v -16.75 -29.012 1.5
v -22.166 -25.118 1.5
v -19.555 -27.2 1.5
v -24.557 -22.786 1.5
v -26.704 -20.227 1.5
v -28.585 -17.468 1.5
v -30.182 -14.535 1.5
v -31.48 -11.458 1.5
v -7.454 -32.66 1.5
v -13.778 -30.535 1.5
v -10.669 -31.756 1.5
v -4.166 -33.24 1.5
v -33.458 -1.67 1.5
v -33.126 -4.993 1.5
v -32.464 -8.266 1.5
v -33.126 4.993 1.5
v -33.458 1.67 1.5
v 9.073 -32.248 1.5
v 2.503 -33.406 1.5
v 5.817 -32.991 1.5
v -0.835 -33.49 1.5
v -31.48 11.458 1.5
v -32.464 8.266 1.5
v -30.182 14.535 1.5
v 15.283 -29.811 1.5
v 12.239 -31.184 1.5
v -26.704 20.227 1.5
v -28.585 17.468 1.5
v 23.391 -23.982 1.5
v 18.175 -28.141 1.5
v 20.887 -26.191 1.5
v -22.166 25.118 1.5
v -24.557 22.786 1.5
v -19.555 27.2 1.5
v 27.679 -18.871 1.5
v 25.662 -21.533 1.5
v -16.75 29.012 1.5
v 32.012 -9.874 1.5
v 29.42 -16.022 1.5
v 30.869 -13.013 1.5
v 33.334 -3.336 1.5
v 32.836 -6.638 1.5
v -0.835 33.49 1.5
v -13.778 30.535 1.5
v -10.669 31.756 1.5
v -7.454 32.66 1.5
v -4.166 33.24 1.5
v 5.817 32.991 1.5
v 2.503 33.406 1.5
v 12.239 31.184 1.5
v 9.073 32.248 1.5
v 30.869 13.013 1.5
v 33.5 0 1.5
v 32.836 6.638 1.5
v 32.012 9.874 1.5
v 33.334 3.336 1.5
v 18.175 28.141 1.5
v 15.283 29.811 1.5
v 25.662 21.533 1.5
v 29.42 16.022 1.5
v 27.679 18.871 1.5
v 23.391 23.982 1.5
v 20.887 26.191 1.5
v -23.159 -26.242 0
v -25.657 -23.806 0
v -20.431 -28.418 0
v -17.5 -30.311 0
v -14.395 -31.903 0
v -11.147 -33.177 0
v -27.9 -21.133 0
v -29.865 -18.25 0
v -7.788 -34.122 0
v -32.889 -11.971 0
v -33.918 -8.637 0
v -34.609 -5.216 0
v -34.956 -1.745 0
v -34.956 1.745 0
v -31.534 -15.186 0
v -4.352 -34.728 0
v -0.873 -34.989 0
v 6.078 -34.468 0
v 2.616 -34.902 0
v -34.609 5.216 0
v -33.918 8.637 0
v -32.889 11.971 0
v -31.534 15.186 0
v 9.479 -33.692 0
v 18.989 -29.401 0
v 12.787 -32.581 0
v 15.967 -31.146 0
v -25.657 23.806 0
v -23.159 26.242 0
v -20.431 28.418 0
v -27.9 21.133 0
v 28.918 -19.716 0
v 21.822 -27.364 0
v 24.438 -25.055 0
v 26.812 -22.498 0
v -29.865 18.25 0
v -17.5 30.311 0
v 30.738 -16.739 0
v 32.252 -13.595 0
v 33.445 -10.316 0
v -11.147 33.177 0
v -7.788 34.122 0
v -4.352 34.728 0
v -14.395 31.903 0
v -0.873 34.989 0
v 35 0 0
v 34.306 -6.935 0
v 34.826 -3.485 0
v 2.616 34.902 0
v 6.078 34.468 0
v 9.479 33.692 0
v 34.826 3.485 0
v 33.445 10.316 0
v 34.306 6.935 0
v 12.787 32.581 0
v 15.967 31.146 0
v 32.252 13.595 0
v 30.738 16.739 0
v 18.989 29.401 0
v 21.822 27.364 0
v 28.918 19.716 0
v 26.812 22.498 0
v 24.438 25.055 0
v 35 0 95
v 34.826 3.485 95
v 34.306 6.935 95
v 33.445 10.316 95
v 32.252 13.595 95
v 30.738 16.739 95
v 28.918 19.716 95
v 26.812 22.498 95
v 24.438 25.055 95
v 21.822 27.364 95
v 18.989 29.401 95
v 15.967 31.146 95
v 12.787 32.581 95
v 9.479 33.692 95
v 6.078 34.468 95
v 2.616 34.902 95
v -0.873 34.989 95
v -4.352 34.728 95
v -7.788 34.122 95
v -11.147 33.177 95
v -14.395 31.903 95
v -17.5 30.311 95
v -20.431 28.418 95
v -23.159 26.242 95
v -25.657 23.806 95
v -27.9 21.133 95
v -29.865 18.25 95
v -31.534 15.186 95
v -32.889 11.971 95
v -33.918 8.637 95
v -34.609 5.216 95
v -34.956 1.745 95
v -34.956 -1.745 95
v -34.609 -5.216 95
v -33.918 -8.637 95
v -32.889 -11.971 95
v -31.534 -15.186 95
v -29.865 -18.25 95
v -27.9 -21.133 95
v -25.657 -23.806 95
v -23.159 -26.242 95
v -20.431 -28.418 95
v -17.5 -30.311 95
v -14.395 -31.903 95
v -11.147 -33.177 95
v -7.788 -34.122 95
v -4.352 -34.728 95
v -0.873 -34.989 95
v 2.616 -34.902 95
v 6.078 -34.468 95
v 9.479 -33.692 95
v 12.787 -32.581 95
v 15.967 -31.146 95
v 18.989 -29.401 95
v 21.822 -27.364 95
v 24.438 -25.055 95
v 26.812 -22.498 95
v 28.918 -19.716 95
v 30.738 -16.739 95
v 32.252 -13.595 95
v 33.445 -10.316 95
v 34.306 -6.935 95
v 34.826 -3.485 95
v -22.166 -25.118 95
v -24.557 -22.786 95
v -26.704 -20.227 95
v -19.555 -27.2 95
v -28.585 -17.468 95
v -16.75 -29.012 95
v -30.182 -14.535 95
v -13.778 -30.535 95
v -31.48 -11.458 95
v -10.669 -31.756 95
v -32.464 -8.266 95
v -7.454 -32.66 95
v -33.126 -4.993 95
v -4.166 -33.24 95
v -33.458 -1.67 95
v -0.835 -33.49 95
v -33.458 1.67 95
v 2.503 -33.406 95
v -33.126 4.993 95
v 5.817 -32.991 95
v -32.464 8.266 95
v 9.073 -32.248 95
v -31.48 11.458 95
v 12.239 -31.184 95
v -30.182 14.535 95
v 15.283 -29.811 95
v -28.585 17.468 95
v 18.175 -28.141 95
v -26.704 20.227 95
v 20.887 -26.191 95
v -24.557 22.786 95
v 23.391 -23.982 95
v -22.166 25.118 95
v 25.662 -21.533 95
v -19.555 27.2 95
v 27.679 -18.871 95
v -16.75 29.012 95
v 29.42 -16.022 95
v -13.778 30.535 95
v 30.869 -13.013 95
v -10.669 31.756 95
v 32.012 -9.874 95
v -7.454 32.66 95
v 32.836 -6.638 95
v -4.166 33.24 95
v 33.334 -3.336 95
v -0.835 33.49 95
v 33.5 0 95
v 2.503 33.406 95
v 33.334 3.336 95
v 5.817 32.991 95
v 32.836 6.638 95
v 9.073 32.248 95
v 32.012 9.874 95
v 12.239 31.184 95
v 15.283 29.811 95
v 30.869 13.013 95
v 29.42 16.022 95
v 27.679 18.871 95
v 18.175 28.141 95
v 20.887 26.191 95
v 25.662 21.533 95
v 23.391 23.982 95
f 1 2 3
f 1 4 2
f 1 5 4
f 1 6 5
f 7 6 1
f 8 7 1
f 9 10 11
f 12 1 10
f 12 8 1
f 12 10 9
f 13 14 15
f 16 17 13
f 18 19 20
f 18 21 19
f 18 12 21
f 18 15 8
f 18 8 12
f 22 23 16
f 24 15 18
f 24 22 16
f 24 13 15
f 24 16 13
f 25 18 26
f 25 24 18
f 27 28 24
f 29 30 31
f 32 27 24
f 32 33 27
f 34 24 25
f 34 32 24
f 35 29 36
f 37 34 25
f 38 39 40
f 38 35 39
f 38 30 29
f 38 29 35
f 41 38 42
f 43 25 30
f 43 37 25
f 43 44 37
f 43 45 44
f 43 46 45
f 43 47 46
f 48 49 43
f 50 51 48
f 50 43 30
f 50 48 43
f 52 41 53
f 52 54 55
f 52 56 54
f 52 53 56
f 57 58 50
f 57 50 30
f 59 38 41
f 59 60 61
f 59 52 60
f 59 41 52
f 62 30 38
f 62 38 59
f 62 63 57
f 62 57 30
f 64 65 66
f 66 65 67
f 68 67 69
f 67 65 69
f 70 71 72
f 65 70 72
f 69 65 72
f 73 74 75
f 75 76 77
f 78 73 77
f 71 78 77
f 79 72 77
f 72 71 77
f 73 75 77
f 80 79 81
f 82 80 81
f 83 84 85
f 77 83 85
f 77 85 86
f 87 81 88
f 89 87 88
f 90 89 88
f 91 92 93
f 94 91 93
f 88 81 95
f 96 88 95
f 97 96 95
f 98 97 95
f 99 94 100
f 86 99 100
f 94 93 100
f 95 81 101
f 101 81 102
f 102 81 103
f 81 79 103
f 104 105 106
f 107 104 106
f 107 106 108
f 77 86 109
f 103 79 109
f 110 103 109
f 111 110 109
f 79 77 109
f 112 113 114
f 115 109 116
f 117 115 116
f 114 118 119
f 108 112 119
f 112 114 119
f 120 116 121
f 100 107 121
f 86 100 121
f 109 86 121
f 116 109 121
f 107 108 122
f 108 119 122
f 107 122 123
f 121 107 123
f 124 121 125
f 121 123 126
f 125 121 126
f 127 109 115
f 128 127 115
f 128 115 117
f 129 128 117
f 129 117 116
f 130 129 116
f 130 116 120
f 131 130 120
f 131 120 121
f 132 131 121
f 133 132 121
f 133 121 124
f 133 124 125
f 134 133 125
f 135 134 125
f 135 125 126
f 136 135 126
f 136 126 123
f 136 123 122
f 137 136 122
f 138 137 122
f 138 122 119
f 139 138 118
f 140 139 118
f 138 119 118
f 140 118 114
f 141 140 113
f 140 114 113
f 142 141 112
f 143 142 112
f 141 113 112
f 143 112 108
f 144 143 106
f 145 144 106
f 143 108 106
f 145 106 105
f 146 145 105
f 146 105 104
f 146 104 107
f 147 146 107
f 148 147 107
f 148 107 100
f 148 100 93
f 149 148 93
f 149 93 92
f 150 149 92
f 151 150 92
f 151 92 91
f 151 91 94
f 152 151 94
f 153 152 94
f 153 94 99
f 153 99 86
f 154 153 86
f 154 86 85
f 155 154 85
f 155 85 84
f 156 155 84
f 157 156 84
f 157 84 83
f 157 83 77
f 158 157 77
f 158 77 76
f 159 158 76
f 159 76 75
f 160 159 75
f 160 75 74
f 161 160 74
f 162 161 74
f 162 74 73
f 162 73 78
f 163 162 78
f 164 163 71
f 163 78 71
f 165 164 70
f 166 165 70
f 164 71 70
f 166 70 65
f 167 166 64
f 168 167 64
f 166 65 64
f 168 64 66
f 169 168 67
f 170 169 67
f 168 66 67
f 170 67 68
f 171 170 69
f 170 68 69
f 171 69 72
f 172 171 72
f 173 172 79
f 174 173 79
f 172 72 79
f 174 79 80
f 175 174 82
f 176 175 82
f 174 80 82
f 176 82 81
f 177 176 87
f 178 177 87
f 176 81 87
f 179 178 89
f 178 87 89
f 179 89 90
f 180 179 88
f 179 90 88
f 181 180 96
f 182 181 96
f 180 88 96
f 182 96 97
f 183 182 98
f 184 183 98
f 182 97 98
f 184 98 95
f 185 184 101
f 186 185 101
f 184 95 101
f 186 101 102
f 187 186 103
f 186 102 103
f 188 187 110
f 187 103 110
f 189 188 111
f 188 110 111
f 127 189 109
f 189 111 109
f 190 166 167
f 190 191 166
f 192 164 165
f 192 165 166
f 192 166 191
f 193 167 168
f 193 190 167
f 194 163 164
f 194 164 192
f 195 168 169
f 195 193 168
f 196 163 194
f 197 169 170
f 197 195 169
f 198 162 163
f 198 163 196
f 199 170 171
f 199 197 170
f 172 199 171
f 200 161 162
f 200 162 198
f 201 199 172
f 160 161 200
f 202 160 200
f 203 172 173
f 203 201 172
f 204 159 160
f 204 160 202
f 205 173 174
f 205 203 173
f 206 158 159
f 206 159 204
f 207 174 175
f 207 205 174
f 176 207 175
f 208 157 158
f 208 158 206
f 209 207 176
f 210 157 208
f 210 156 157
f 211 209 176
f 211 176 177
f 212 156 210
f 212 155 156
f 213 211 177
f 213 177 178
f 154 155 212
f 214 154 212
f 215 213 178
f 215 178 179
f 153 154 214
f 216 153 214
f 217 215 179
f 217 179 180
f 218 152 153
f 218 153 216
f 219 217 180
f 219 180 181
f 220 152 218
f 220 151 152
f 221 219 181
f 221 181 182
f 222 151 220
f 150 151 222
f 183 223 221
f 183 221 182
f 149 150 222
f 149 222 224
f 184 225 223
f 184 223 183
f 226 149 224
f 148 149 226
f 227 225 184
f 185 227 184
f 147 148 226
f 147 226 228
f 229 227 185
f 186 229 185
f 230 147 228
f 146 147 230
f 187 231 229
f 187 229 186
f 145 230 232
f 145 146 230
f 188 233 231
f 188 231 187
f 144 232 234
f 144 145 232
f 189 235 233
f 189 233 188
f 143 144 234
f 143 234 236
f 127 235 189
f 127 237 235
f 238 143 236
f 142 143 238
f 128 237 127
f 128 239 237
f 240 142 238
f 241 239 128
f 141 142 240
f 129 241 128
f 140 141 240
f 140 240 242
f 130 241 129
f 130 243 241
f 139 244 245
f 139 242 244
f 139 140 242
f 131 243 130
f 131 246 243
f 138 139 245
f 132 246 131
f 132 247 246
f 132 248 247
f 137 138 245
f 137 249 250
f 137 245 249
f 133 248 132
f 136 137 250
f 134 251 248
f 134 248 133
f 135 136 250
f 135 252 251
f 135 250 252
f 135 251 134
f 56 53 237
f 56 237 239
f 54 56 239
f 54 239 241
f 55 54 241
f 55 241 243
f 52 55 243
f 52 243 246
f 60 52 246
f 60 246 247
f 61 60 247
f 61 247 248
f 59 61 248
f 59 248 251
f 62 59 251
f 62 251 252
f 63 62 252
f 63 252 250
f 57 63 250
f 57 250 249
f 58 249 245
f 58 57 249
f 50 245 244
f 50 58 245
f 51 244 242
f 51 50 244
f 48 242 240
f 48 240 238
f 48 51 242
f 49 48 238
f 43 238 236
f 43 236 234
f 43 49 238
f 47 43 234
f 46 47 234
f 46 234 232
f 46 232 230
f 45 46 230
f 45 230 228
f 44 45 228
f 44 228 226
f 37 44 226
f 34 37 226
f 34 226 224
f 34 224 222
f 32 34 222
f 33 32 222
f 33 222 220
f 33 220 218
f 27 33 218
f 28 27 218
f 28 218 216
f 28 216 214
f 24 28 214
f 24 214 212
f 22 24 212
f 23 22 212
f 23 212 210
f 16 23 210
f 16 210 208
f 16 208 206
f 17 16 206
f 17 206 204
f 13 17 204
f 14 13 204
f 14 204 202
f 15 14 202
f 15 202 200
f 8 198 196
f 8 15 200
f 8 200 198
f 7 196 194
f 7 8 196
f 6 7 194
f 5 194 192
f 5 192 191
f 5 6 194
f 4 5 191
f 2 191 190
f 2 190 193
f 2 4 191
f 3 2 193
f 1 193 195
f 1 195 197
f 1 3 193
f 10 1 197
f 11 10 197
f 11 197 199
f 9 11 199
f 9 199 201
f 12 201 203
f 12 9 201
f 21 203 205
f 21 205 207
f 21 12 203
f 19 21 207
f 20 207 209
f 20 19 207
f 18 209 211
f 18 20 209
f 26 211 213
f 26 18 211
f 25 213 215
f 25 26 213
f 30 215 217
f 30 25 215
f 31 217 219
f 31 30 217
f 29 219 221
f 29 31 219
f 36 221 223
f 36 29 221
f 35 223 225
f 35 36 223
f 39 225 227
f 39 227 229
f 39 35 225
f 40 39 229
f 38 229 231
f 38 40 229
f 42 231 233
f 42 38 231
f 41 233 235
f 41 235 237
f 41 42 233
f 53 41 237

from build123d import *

# Parameters (mm, degrees)
F0_R     = 35
F1_DEPTH = 95
F2_T     = -1.5
F3_R     = 35
F4_DEPTH = 1.5


with BuildPart() as f1:
    # F0 (on Top) → F1 (new body)
    with BuildSketch(Plane.XY):
        Circle(F0_R)
    extrude(amount=F1_DEPTH)

    # F2
    f2_openings = [f1.faces().sort_by_distance(p)[0] for p in [
        (0, 0, 95),
    ]]
    offset(amount=F2_T, openings=f2_openings)

    # F3 (on Top) → F4 (join)
    with BuildSketch(Plane.XY):
        Circle(F3_R)
    extrude(amount=F4_DEPTH)


solid = f1.part
